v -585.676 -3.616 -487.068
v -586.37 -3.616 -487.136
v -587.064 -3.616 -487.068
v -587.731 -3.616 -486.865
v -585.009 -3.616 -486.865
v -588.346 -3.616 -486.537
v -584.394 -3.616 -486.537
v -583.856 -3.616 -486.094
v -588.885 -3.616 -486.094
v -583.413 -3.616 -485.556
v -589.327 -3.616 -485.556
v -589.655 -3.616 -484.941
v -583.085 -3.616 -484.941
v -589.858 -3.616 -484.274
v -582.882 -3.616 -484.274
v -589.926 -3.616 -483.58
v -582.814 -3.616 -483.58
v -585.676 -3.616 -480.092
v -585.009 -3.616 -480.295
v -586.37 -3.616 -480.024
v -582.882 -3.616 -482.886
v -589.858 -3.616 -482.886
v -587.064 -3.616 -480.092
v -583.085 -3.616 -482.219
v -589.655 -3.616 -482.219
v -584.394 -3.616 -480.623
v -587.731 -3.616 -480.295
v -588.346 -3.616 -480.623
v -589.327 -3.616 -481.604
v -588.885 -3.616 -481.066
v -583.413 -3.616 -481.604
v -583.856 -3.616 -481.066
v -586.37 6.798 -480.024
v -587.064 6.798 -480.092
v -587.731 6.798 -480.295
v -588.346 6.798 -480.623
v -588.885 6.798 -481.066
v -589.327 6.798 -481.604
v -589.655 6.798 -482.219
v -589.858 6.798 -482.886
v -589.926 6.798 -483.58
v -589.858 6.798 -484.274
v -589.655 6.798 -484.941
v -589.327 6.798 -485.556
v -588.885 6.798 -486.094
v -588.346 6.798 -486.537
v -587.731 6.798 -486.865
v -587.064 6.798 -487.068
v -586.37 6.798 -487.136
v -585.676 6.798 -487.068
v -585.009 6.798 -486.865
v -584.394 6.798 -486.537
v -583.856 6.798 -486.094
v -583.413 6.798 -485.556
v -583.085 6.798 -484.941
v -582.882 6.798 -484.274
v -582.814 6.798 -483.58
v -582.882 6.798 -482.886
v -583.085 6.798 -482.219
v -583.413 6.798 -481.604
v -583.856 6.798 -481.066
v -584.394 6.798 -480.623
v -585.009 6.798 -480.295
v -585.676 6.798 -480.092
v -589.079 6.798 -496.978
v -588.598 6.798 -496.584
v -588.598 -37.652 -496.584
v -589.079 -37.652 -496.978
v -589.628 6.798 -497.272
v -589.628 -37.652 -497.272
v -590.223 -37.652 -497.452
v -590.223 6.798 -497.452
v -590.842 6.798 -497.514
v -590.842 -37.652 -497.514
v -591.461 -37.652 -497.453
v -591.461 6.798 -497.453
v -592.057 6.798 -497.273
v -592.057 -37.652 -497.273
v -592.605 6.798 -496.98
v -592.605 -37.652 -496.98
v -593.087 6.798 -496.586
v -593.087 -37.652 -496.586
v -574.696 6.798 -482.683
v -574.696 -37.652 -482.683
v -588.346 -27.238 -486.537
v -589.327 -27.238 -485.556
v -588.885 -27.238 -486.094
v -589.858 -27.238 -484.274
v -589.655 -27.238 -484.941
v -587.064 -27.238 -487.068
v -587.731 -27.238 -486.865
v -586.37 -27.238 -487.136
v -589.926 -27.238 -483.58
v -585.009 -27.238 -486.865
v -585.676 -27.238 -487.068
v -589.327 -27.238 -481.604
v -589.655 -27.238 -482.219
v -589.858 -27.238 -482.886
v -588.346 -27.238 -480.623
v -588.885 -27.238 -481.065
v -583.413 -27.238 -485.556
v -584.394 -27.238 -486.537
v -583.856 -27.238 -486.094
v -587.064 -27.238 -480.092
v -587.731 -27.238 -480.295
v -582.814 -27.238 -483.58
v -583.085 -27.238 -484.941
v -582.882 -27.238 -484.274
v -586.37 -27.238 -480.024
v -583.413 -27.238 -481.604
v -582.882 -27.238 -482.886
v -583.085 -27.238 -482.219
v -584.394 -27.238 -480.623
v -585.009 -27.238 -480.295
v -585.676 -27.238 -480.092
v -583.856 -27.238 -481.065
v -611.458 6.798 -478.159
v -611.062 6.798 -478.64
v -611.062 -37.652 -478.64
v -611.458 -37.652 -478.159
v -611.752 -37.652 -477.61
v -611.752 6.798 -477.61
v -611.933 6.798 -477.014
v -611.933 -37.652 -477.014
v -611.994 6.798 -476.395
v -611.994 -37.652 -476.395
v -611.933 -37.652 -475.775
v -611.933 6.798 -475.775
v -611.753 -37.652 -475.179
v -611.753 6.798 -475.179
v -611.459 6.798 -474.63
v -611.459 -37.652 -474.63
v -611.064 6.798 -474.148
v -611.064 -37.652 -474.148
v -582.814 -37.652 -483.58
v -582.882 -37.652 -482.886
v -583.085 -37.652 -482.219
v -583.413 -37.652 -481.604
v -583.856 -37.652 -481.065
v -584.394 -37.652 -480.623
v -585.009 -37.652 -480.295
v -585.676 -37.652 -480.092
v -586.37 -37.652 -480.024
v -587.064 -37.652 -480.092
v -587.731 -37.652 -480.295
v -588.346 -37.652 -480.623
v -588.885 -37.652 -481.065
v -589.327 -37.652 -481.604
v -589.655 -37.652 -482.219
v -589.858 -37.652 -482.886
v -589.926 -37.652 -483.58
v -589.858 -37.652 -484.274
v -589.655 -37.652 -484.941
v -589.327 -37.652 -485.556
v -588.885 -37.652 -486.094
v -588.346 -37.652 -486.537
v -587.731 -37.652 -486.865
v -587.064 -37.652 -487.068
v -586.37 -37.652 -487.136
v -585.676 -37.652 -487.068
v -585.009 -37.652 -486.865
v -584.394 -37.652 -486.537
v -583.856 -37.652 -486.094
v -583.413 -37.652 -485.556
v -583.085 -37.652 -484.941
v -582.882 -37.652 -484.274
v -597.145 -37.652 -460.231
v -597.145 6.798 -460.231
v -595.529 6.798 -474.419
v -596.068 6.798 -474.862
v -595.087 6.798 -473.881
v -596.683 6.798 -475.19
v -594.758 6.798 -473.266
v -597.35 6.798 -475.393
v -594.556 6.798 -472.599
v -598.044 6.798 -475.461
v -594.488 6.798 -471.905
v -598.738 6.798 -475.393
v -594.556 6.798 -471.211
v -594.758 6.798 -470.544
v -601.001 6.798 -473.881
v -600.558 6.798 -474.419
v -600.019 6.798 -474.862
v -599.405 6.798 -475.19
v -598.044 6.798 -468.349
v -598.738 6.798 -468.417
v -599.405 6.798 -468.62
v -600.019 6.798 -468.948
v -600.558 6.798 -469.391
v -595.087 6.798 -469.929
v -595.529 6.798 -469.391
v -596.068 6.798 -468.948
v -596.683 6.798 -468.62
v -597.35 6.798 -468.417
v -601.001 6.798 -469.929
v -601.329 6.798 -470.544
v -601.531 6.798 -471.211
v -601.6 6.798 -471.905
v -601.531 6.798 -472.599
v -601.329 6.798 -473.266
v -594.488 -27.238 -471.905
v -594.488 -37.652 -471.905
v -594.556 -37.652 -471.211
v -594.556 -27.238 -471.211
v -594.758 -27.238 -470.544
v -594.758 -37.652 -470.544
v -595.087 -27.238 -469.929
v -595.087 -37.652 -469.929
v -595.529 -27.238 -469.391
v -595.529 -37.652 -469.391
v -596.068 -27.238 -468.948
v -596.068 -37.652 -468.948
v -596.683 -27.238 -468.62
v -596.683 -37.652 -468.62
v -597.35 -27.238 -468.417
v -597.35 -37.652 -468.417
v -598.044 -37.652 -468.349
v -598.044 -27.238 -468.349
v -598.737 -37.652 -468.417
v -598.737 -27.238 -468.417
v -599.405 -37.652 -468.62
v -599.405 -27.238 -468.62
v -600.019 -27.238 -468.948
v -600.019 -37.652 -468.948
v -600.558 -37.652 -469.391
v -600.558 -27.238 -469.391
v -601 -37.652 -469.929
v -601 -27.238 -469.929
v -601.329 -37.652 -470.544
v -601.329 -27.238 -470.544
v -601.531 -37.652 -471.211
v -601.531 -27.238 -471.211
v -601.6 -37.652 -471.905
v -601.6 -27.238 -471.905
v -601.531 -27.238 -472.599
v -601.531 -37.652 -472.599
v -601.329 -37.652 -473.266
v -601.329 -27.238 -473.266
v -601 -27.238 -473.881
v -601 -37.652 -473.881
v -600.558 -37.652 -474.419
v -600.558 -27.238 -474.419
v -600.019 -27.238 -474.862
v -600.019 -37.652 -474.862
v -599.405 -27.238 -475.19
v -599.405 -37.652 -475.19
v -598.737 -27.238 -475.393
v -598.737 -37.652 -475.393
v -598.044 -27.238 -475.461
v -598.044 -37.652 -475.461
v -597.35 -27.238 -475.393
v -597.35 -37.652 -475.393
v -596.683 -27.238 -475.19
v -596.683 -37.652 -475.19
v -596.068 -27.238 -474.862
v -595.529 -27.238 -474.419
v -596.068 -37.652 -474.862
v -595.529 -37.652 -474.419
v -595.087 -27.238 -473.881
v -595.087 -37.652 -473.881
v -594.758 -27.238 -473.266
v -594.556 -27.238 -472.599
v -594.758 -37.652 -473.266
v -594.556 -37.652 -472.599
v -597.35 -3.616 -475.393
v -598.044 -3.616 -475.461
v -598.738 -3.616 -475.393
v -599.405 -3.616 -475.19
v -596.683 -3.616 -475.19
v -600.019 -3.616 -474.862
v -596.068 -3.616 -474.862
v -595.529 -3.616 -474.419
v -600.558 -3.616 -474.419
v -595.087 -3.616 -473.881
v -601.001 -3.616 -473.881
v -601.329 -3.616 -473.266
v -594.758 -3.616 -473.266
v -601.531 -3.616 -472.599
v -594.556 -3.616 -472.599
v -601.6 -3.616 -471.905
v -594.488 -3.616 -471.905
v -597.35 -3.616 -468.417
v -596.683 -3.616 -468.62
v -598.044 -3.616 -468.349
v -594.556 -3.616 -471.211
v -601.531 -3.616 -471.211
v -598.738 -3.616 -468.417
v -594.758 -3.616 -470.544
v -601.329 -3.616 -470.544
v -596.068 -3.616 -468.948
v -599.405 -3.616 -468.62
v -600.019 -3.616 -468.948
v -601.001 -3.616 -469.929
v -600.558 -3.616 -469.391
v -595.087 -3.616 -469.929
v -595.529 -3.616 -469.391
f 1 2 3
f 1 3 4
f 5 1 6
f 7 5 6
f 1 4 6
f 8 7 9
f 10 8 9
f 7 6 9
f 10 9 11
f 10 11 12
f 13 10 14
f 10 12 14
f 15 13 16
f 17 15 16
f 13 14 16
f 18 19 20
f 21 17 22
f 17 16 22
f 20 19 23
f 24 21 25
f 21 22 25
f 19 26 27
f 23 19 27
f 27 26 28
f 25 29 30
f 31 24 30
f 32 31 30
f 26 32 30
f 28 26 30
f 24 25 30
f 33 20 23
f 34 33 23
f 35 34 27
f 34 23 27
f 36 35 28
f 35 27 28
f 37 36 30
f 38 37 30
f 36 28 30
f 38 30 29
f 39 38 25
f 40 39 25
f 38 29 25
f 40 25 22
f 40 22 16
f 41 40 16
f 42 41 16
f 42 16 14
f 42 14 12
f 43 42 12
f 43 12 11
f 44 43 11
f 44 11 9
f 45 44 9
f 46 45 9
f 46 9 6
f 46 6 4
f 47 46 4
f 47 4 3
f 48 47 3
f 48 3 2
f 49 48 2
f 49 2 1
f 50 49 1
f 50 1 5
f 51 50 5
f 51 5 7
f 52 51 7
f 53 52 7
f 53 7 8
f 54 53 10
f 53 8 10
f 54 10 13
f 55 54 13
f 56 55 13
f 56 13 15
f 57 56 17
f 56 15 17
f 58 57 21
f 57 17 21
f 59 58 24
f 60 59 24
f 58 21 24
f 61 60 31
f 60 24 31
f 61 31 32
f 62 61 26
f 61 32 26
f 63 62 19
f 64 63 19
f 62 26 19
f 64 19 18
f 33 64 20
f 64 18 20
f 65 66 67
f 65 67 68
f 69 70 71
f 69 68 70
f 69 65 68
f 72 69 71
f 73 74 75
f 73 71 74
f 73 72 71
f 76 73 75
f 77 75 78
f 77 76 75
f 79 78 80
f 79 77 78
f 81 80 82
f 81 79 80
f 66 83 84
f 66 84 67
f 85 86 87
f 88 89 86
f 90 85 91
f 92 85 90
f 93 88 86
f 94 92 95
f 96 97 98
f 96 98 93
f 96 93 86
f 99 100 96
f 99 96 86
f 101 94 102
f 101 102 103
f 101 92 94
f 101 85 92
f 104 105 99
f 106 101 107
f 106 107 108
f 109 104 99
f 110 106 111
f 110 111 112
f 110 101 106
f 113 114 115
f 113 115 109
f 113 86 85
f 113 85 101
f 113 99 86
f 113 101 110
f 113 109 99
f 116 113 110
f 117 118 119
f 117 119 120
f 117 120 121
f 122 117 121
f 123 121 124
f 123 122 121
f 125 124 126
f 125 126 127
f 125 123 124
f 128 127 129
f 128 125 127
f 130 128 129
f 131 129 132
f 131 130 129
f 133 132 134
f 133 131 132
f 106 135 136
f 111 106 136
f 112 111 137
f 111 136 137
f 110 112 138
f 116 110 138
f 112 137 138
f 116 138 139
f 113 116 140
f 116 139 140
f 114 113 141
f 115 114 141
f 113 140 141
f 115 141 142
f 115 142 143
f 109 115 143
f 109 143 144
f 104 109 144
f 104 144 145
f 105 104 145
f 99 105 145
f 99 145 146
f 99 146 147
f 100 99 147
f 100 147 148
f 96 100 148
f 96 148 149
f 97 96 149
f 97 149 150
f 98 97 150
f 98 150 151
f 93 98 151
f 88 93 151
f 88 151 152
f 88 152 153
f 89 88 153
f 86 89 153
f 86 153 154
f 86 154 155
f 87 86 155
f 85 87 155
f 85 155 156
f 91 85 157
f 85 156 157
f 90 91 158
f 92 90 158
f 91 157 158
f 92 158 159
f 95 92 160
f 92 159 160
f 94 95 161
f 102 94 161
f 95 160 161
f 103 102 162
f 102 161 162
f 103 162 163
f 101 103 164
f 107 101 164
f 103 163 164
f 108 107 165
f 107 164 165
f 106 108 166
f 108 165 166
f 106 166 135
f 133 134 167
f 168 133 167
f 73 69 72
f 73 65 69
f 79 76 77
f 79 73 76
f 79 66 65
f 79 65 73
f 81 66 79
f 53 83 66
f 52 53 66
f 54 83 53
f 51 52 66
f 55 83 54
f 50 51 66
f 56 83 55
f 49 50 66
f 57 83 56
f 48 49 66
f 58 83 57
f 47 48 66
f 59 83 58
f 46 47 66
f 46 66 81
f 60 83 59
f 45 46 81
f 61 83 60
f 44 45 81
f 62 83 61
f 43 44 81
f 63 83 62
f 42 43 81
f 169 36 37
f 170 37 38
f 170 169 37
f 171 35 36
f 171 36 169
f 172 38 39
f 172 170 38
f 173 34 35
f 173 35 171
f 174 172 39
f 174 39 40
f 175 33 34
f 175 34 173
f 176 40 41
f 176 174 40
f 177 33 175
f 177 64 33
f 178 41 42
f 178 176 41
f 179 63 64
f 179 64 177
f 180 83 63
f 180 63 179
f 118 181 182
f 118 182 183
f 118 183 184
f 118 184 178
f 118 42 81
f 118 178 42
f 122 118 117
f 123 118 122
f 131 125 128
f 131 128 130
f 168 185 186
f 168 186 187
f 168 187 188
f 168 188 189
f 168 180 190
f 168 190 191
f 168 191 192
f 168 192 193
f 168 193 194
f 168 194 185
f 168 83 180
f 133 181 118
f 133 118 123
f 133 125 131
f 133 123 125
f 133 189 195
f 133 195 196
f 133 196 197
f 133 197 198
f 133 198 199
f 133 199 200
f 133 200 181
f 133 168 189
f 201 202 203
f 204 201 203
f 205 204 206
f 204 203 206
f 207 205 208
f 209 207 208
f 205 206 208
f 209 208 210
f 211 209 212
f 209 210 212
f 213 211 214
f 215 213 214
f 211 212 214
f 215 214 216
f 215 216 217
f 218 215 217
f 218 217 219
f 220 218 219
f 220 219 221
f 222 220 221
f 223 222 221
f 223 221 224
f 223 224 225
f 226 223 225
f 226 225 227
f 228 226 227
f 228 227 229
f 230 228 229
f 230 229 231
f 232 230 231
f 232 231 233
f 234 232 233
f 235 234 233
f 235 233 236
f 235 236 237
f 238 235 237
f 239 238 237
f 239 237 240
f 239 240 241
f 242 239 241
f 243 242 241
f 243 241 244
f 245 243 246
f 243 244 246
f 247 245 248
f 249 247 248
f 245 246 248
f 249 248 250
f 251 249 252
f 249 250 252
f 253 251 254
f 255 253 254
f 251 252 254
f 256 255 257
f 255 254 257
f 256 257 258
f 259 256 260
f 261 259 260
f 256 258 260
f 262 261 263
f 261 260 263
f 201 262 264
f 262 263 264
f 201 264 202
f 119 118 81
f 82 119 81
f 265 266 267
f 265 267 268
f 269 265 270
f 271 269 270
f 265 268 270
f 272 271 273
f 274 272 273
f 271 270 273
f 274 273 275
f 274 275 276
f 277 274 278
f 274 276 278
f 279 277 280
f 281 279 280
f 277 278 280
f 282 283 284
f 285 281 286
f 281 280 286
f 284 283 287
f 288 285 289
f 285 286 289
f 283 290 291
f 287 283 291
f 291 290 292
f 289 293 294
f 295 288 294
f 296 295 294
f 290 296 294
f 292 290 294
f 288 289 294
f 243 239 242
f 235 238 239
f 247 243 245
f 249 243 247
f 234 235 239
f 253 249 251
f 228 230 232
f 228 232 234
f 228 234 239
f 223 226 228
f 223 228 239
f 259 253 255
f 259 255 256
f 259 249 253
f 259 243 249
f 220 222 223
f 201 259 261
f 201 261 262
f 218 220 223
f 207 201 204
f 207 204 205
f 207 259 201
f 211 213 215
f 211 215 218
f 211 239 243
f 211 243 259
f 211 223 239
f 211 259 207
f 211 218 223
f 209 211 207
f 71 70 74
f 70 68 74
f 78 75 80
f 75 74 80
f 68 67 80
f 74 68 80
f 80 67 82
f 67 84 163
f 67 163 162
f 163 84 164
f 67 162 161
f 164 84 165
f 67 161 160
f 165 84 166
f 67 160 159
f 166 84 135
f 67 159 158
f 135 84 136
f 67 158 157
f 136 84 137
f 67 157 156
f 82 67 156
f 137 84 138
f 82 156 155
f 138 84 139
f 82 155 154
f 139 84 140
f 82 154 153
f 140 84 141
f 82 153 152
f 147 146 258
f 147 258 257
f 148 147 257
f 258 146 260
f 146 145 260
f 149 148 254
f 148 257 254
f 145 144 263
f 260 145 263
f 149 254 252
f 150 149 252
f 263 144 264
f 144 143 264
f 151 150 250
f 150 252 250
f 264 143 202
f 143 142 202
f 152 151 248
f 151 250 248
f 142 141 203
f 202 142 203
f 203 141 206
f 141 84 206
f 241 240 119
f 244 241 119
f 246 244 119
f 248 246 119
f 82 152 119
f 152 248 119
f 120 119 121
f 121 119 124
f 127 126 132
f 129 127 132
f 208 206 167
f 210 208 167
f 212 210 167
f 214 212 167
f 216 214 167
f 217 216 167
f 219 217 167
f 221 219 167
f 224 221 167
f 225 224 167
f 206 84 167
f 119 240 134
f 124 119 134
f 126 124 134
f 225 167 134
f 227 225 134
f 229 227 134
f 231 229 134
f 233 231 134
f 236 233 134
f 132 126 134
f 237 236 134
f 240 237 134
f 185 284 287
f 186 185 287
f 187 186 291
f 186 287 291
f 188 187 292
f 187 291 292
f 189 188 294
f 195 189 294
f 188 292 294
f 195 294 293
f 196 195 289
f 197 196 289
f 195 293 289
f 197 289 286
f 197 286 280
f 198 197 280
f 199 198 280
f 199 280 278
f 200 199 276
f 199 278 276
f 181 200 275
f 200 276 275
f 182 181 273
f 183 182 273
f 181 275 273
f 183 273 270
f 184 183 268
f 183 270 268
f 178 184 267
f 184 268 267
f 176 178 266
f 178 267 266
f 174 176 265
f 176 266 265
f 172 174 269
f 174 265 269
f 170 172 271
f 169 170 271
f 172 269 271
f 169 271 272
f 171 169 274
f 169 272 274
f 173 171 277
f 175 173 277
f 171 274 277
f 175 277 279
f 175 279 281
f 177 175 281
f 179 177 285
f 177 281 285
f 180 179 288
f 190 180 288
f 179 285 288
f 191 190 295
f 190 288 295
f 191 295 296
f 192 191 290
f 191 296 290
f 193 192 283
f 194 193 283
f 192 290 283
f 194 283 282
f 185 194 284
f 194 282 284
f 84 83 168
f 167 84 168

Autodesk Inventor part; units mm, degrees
ref_plane "YZ Plane" through (0, 0, 0) normal (1, 0, 0) x (0, 1, 0)
ref_plane "XZ Plane" through (0, 0, 0) normal (0, 1, 0) x (-1, 0, 0)
ref_plane "XY Plane" through (0, 0, 0) normal (0, 0, 1) x (1, 0, 0)
ref_plane "Work Plane1" through (49.1494, -37.6525, 49.2967) normal (0, 1, 0) x (-1, 0, 0)
sketch "Sketch2" plane through (49.1494, -37.6525, 49.2967) normal (0, 1, 0) x (-1, 0, 0)
  line L0 (662.4608, -525.6919) -> (646.2945, -509.5274) projected
  line L1 (143.1429, -6.4305) -> (69.9168, -79.6645) projected
  line L2 (623.8451, -531.9793) -> (639.991, -548.1234) projected
  line L3 (104.5272, -12.7179) -> (126.9766, 9.734) projected
  line L4 (646.2945, -509.5274) -> (662.4608, -525.6919)
  line L5 (662.4608, -525.6919) -> (639.991, -548.1234)
  line L6 (639.991, -548.1234) -> (623.8451, -531.9793)
  line L7 (623.8451, -531.9793) -> (646.2945, -509.5274)
  point P0 (49.1494, -49.2967)
  point P1 (69.9168, -79.6645)
extrude "Extrusion2" add sketch "Sketch2" along normal blind 44.45
sketch "Sketch3" plane through (49.1494, 6.7975, 49.2967) normal (0, 1, 0) x (1, 0, 0)
  circle A0 centre (-647.1931, 521.2017) radius 2.4765 projected
  circle A1 centre (-635.5195, 532.8766) radius 2.4765 projected
  point P0 (-49.1494, 49.2967)
hole "Hole1" at (-586.3701, 6.7975, -483.58) at (-598.0438, 6.7975, -471.905) direction (0, -1, 0) diameter 7.112 depth 10.414
sketch "Sketch4" plane through (49.1494, -37.6525, 49.2967) normal (0, -1, 0) x (1, 0, 0)
  circle A0 centre (-647.1931, -521.2017) radius 3.556 projected
  circle A1 centre (-635.5195, -532.8766) radius 3.556 projected
  point P0 (-49.1494, -49.2967)
extrude "Extrusion3" cut sketch "Sketch4" against normal blind 10.414
fillet "Fillet1" radius 3.175 2 edges at (-590.8417, -15.4275, -498.8268) (-613.3114, -15.4275, -476.3953)
properties part number "Standoff"
